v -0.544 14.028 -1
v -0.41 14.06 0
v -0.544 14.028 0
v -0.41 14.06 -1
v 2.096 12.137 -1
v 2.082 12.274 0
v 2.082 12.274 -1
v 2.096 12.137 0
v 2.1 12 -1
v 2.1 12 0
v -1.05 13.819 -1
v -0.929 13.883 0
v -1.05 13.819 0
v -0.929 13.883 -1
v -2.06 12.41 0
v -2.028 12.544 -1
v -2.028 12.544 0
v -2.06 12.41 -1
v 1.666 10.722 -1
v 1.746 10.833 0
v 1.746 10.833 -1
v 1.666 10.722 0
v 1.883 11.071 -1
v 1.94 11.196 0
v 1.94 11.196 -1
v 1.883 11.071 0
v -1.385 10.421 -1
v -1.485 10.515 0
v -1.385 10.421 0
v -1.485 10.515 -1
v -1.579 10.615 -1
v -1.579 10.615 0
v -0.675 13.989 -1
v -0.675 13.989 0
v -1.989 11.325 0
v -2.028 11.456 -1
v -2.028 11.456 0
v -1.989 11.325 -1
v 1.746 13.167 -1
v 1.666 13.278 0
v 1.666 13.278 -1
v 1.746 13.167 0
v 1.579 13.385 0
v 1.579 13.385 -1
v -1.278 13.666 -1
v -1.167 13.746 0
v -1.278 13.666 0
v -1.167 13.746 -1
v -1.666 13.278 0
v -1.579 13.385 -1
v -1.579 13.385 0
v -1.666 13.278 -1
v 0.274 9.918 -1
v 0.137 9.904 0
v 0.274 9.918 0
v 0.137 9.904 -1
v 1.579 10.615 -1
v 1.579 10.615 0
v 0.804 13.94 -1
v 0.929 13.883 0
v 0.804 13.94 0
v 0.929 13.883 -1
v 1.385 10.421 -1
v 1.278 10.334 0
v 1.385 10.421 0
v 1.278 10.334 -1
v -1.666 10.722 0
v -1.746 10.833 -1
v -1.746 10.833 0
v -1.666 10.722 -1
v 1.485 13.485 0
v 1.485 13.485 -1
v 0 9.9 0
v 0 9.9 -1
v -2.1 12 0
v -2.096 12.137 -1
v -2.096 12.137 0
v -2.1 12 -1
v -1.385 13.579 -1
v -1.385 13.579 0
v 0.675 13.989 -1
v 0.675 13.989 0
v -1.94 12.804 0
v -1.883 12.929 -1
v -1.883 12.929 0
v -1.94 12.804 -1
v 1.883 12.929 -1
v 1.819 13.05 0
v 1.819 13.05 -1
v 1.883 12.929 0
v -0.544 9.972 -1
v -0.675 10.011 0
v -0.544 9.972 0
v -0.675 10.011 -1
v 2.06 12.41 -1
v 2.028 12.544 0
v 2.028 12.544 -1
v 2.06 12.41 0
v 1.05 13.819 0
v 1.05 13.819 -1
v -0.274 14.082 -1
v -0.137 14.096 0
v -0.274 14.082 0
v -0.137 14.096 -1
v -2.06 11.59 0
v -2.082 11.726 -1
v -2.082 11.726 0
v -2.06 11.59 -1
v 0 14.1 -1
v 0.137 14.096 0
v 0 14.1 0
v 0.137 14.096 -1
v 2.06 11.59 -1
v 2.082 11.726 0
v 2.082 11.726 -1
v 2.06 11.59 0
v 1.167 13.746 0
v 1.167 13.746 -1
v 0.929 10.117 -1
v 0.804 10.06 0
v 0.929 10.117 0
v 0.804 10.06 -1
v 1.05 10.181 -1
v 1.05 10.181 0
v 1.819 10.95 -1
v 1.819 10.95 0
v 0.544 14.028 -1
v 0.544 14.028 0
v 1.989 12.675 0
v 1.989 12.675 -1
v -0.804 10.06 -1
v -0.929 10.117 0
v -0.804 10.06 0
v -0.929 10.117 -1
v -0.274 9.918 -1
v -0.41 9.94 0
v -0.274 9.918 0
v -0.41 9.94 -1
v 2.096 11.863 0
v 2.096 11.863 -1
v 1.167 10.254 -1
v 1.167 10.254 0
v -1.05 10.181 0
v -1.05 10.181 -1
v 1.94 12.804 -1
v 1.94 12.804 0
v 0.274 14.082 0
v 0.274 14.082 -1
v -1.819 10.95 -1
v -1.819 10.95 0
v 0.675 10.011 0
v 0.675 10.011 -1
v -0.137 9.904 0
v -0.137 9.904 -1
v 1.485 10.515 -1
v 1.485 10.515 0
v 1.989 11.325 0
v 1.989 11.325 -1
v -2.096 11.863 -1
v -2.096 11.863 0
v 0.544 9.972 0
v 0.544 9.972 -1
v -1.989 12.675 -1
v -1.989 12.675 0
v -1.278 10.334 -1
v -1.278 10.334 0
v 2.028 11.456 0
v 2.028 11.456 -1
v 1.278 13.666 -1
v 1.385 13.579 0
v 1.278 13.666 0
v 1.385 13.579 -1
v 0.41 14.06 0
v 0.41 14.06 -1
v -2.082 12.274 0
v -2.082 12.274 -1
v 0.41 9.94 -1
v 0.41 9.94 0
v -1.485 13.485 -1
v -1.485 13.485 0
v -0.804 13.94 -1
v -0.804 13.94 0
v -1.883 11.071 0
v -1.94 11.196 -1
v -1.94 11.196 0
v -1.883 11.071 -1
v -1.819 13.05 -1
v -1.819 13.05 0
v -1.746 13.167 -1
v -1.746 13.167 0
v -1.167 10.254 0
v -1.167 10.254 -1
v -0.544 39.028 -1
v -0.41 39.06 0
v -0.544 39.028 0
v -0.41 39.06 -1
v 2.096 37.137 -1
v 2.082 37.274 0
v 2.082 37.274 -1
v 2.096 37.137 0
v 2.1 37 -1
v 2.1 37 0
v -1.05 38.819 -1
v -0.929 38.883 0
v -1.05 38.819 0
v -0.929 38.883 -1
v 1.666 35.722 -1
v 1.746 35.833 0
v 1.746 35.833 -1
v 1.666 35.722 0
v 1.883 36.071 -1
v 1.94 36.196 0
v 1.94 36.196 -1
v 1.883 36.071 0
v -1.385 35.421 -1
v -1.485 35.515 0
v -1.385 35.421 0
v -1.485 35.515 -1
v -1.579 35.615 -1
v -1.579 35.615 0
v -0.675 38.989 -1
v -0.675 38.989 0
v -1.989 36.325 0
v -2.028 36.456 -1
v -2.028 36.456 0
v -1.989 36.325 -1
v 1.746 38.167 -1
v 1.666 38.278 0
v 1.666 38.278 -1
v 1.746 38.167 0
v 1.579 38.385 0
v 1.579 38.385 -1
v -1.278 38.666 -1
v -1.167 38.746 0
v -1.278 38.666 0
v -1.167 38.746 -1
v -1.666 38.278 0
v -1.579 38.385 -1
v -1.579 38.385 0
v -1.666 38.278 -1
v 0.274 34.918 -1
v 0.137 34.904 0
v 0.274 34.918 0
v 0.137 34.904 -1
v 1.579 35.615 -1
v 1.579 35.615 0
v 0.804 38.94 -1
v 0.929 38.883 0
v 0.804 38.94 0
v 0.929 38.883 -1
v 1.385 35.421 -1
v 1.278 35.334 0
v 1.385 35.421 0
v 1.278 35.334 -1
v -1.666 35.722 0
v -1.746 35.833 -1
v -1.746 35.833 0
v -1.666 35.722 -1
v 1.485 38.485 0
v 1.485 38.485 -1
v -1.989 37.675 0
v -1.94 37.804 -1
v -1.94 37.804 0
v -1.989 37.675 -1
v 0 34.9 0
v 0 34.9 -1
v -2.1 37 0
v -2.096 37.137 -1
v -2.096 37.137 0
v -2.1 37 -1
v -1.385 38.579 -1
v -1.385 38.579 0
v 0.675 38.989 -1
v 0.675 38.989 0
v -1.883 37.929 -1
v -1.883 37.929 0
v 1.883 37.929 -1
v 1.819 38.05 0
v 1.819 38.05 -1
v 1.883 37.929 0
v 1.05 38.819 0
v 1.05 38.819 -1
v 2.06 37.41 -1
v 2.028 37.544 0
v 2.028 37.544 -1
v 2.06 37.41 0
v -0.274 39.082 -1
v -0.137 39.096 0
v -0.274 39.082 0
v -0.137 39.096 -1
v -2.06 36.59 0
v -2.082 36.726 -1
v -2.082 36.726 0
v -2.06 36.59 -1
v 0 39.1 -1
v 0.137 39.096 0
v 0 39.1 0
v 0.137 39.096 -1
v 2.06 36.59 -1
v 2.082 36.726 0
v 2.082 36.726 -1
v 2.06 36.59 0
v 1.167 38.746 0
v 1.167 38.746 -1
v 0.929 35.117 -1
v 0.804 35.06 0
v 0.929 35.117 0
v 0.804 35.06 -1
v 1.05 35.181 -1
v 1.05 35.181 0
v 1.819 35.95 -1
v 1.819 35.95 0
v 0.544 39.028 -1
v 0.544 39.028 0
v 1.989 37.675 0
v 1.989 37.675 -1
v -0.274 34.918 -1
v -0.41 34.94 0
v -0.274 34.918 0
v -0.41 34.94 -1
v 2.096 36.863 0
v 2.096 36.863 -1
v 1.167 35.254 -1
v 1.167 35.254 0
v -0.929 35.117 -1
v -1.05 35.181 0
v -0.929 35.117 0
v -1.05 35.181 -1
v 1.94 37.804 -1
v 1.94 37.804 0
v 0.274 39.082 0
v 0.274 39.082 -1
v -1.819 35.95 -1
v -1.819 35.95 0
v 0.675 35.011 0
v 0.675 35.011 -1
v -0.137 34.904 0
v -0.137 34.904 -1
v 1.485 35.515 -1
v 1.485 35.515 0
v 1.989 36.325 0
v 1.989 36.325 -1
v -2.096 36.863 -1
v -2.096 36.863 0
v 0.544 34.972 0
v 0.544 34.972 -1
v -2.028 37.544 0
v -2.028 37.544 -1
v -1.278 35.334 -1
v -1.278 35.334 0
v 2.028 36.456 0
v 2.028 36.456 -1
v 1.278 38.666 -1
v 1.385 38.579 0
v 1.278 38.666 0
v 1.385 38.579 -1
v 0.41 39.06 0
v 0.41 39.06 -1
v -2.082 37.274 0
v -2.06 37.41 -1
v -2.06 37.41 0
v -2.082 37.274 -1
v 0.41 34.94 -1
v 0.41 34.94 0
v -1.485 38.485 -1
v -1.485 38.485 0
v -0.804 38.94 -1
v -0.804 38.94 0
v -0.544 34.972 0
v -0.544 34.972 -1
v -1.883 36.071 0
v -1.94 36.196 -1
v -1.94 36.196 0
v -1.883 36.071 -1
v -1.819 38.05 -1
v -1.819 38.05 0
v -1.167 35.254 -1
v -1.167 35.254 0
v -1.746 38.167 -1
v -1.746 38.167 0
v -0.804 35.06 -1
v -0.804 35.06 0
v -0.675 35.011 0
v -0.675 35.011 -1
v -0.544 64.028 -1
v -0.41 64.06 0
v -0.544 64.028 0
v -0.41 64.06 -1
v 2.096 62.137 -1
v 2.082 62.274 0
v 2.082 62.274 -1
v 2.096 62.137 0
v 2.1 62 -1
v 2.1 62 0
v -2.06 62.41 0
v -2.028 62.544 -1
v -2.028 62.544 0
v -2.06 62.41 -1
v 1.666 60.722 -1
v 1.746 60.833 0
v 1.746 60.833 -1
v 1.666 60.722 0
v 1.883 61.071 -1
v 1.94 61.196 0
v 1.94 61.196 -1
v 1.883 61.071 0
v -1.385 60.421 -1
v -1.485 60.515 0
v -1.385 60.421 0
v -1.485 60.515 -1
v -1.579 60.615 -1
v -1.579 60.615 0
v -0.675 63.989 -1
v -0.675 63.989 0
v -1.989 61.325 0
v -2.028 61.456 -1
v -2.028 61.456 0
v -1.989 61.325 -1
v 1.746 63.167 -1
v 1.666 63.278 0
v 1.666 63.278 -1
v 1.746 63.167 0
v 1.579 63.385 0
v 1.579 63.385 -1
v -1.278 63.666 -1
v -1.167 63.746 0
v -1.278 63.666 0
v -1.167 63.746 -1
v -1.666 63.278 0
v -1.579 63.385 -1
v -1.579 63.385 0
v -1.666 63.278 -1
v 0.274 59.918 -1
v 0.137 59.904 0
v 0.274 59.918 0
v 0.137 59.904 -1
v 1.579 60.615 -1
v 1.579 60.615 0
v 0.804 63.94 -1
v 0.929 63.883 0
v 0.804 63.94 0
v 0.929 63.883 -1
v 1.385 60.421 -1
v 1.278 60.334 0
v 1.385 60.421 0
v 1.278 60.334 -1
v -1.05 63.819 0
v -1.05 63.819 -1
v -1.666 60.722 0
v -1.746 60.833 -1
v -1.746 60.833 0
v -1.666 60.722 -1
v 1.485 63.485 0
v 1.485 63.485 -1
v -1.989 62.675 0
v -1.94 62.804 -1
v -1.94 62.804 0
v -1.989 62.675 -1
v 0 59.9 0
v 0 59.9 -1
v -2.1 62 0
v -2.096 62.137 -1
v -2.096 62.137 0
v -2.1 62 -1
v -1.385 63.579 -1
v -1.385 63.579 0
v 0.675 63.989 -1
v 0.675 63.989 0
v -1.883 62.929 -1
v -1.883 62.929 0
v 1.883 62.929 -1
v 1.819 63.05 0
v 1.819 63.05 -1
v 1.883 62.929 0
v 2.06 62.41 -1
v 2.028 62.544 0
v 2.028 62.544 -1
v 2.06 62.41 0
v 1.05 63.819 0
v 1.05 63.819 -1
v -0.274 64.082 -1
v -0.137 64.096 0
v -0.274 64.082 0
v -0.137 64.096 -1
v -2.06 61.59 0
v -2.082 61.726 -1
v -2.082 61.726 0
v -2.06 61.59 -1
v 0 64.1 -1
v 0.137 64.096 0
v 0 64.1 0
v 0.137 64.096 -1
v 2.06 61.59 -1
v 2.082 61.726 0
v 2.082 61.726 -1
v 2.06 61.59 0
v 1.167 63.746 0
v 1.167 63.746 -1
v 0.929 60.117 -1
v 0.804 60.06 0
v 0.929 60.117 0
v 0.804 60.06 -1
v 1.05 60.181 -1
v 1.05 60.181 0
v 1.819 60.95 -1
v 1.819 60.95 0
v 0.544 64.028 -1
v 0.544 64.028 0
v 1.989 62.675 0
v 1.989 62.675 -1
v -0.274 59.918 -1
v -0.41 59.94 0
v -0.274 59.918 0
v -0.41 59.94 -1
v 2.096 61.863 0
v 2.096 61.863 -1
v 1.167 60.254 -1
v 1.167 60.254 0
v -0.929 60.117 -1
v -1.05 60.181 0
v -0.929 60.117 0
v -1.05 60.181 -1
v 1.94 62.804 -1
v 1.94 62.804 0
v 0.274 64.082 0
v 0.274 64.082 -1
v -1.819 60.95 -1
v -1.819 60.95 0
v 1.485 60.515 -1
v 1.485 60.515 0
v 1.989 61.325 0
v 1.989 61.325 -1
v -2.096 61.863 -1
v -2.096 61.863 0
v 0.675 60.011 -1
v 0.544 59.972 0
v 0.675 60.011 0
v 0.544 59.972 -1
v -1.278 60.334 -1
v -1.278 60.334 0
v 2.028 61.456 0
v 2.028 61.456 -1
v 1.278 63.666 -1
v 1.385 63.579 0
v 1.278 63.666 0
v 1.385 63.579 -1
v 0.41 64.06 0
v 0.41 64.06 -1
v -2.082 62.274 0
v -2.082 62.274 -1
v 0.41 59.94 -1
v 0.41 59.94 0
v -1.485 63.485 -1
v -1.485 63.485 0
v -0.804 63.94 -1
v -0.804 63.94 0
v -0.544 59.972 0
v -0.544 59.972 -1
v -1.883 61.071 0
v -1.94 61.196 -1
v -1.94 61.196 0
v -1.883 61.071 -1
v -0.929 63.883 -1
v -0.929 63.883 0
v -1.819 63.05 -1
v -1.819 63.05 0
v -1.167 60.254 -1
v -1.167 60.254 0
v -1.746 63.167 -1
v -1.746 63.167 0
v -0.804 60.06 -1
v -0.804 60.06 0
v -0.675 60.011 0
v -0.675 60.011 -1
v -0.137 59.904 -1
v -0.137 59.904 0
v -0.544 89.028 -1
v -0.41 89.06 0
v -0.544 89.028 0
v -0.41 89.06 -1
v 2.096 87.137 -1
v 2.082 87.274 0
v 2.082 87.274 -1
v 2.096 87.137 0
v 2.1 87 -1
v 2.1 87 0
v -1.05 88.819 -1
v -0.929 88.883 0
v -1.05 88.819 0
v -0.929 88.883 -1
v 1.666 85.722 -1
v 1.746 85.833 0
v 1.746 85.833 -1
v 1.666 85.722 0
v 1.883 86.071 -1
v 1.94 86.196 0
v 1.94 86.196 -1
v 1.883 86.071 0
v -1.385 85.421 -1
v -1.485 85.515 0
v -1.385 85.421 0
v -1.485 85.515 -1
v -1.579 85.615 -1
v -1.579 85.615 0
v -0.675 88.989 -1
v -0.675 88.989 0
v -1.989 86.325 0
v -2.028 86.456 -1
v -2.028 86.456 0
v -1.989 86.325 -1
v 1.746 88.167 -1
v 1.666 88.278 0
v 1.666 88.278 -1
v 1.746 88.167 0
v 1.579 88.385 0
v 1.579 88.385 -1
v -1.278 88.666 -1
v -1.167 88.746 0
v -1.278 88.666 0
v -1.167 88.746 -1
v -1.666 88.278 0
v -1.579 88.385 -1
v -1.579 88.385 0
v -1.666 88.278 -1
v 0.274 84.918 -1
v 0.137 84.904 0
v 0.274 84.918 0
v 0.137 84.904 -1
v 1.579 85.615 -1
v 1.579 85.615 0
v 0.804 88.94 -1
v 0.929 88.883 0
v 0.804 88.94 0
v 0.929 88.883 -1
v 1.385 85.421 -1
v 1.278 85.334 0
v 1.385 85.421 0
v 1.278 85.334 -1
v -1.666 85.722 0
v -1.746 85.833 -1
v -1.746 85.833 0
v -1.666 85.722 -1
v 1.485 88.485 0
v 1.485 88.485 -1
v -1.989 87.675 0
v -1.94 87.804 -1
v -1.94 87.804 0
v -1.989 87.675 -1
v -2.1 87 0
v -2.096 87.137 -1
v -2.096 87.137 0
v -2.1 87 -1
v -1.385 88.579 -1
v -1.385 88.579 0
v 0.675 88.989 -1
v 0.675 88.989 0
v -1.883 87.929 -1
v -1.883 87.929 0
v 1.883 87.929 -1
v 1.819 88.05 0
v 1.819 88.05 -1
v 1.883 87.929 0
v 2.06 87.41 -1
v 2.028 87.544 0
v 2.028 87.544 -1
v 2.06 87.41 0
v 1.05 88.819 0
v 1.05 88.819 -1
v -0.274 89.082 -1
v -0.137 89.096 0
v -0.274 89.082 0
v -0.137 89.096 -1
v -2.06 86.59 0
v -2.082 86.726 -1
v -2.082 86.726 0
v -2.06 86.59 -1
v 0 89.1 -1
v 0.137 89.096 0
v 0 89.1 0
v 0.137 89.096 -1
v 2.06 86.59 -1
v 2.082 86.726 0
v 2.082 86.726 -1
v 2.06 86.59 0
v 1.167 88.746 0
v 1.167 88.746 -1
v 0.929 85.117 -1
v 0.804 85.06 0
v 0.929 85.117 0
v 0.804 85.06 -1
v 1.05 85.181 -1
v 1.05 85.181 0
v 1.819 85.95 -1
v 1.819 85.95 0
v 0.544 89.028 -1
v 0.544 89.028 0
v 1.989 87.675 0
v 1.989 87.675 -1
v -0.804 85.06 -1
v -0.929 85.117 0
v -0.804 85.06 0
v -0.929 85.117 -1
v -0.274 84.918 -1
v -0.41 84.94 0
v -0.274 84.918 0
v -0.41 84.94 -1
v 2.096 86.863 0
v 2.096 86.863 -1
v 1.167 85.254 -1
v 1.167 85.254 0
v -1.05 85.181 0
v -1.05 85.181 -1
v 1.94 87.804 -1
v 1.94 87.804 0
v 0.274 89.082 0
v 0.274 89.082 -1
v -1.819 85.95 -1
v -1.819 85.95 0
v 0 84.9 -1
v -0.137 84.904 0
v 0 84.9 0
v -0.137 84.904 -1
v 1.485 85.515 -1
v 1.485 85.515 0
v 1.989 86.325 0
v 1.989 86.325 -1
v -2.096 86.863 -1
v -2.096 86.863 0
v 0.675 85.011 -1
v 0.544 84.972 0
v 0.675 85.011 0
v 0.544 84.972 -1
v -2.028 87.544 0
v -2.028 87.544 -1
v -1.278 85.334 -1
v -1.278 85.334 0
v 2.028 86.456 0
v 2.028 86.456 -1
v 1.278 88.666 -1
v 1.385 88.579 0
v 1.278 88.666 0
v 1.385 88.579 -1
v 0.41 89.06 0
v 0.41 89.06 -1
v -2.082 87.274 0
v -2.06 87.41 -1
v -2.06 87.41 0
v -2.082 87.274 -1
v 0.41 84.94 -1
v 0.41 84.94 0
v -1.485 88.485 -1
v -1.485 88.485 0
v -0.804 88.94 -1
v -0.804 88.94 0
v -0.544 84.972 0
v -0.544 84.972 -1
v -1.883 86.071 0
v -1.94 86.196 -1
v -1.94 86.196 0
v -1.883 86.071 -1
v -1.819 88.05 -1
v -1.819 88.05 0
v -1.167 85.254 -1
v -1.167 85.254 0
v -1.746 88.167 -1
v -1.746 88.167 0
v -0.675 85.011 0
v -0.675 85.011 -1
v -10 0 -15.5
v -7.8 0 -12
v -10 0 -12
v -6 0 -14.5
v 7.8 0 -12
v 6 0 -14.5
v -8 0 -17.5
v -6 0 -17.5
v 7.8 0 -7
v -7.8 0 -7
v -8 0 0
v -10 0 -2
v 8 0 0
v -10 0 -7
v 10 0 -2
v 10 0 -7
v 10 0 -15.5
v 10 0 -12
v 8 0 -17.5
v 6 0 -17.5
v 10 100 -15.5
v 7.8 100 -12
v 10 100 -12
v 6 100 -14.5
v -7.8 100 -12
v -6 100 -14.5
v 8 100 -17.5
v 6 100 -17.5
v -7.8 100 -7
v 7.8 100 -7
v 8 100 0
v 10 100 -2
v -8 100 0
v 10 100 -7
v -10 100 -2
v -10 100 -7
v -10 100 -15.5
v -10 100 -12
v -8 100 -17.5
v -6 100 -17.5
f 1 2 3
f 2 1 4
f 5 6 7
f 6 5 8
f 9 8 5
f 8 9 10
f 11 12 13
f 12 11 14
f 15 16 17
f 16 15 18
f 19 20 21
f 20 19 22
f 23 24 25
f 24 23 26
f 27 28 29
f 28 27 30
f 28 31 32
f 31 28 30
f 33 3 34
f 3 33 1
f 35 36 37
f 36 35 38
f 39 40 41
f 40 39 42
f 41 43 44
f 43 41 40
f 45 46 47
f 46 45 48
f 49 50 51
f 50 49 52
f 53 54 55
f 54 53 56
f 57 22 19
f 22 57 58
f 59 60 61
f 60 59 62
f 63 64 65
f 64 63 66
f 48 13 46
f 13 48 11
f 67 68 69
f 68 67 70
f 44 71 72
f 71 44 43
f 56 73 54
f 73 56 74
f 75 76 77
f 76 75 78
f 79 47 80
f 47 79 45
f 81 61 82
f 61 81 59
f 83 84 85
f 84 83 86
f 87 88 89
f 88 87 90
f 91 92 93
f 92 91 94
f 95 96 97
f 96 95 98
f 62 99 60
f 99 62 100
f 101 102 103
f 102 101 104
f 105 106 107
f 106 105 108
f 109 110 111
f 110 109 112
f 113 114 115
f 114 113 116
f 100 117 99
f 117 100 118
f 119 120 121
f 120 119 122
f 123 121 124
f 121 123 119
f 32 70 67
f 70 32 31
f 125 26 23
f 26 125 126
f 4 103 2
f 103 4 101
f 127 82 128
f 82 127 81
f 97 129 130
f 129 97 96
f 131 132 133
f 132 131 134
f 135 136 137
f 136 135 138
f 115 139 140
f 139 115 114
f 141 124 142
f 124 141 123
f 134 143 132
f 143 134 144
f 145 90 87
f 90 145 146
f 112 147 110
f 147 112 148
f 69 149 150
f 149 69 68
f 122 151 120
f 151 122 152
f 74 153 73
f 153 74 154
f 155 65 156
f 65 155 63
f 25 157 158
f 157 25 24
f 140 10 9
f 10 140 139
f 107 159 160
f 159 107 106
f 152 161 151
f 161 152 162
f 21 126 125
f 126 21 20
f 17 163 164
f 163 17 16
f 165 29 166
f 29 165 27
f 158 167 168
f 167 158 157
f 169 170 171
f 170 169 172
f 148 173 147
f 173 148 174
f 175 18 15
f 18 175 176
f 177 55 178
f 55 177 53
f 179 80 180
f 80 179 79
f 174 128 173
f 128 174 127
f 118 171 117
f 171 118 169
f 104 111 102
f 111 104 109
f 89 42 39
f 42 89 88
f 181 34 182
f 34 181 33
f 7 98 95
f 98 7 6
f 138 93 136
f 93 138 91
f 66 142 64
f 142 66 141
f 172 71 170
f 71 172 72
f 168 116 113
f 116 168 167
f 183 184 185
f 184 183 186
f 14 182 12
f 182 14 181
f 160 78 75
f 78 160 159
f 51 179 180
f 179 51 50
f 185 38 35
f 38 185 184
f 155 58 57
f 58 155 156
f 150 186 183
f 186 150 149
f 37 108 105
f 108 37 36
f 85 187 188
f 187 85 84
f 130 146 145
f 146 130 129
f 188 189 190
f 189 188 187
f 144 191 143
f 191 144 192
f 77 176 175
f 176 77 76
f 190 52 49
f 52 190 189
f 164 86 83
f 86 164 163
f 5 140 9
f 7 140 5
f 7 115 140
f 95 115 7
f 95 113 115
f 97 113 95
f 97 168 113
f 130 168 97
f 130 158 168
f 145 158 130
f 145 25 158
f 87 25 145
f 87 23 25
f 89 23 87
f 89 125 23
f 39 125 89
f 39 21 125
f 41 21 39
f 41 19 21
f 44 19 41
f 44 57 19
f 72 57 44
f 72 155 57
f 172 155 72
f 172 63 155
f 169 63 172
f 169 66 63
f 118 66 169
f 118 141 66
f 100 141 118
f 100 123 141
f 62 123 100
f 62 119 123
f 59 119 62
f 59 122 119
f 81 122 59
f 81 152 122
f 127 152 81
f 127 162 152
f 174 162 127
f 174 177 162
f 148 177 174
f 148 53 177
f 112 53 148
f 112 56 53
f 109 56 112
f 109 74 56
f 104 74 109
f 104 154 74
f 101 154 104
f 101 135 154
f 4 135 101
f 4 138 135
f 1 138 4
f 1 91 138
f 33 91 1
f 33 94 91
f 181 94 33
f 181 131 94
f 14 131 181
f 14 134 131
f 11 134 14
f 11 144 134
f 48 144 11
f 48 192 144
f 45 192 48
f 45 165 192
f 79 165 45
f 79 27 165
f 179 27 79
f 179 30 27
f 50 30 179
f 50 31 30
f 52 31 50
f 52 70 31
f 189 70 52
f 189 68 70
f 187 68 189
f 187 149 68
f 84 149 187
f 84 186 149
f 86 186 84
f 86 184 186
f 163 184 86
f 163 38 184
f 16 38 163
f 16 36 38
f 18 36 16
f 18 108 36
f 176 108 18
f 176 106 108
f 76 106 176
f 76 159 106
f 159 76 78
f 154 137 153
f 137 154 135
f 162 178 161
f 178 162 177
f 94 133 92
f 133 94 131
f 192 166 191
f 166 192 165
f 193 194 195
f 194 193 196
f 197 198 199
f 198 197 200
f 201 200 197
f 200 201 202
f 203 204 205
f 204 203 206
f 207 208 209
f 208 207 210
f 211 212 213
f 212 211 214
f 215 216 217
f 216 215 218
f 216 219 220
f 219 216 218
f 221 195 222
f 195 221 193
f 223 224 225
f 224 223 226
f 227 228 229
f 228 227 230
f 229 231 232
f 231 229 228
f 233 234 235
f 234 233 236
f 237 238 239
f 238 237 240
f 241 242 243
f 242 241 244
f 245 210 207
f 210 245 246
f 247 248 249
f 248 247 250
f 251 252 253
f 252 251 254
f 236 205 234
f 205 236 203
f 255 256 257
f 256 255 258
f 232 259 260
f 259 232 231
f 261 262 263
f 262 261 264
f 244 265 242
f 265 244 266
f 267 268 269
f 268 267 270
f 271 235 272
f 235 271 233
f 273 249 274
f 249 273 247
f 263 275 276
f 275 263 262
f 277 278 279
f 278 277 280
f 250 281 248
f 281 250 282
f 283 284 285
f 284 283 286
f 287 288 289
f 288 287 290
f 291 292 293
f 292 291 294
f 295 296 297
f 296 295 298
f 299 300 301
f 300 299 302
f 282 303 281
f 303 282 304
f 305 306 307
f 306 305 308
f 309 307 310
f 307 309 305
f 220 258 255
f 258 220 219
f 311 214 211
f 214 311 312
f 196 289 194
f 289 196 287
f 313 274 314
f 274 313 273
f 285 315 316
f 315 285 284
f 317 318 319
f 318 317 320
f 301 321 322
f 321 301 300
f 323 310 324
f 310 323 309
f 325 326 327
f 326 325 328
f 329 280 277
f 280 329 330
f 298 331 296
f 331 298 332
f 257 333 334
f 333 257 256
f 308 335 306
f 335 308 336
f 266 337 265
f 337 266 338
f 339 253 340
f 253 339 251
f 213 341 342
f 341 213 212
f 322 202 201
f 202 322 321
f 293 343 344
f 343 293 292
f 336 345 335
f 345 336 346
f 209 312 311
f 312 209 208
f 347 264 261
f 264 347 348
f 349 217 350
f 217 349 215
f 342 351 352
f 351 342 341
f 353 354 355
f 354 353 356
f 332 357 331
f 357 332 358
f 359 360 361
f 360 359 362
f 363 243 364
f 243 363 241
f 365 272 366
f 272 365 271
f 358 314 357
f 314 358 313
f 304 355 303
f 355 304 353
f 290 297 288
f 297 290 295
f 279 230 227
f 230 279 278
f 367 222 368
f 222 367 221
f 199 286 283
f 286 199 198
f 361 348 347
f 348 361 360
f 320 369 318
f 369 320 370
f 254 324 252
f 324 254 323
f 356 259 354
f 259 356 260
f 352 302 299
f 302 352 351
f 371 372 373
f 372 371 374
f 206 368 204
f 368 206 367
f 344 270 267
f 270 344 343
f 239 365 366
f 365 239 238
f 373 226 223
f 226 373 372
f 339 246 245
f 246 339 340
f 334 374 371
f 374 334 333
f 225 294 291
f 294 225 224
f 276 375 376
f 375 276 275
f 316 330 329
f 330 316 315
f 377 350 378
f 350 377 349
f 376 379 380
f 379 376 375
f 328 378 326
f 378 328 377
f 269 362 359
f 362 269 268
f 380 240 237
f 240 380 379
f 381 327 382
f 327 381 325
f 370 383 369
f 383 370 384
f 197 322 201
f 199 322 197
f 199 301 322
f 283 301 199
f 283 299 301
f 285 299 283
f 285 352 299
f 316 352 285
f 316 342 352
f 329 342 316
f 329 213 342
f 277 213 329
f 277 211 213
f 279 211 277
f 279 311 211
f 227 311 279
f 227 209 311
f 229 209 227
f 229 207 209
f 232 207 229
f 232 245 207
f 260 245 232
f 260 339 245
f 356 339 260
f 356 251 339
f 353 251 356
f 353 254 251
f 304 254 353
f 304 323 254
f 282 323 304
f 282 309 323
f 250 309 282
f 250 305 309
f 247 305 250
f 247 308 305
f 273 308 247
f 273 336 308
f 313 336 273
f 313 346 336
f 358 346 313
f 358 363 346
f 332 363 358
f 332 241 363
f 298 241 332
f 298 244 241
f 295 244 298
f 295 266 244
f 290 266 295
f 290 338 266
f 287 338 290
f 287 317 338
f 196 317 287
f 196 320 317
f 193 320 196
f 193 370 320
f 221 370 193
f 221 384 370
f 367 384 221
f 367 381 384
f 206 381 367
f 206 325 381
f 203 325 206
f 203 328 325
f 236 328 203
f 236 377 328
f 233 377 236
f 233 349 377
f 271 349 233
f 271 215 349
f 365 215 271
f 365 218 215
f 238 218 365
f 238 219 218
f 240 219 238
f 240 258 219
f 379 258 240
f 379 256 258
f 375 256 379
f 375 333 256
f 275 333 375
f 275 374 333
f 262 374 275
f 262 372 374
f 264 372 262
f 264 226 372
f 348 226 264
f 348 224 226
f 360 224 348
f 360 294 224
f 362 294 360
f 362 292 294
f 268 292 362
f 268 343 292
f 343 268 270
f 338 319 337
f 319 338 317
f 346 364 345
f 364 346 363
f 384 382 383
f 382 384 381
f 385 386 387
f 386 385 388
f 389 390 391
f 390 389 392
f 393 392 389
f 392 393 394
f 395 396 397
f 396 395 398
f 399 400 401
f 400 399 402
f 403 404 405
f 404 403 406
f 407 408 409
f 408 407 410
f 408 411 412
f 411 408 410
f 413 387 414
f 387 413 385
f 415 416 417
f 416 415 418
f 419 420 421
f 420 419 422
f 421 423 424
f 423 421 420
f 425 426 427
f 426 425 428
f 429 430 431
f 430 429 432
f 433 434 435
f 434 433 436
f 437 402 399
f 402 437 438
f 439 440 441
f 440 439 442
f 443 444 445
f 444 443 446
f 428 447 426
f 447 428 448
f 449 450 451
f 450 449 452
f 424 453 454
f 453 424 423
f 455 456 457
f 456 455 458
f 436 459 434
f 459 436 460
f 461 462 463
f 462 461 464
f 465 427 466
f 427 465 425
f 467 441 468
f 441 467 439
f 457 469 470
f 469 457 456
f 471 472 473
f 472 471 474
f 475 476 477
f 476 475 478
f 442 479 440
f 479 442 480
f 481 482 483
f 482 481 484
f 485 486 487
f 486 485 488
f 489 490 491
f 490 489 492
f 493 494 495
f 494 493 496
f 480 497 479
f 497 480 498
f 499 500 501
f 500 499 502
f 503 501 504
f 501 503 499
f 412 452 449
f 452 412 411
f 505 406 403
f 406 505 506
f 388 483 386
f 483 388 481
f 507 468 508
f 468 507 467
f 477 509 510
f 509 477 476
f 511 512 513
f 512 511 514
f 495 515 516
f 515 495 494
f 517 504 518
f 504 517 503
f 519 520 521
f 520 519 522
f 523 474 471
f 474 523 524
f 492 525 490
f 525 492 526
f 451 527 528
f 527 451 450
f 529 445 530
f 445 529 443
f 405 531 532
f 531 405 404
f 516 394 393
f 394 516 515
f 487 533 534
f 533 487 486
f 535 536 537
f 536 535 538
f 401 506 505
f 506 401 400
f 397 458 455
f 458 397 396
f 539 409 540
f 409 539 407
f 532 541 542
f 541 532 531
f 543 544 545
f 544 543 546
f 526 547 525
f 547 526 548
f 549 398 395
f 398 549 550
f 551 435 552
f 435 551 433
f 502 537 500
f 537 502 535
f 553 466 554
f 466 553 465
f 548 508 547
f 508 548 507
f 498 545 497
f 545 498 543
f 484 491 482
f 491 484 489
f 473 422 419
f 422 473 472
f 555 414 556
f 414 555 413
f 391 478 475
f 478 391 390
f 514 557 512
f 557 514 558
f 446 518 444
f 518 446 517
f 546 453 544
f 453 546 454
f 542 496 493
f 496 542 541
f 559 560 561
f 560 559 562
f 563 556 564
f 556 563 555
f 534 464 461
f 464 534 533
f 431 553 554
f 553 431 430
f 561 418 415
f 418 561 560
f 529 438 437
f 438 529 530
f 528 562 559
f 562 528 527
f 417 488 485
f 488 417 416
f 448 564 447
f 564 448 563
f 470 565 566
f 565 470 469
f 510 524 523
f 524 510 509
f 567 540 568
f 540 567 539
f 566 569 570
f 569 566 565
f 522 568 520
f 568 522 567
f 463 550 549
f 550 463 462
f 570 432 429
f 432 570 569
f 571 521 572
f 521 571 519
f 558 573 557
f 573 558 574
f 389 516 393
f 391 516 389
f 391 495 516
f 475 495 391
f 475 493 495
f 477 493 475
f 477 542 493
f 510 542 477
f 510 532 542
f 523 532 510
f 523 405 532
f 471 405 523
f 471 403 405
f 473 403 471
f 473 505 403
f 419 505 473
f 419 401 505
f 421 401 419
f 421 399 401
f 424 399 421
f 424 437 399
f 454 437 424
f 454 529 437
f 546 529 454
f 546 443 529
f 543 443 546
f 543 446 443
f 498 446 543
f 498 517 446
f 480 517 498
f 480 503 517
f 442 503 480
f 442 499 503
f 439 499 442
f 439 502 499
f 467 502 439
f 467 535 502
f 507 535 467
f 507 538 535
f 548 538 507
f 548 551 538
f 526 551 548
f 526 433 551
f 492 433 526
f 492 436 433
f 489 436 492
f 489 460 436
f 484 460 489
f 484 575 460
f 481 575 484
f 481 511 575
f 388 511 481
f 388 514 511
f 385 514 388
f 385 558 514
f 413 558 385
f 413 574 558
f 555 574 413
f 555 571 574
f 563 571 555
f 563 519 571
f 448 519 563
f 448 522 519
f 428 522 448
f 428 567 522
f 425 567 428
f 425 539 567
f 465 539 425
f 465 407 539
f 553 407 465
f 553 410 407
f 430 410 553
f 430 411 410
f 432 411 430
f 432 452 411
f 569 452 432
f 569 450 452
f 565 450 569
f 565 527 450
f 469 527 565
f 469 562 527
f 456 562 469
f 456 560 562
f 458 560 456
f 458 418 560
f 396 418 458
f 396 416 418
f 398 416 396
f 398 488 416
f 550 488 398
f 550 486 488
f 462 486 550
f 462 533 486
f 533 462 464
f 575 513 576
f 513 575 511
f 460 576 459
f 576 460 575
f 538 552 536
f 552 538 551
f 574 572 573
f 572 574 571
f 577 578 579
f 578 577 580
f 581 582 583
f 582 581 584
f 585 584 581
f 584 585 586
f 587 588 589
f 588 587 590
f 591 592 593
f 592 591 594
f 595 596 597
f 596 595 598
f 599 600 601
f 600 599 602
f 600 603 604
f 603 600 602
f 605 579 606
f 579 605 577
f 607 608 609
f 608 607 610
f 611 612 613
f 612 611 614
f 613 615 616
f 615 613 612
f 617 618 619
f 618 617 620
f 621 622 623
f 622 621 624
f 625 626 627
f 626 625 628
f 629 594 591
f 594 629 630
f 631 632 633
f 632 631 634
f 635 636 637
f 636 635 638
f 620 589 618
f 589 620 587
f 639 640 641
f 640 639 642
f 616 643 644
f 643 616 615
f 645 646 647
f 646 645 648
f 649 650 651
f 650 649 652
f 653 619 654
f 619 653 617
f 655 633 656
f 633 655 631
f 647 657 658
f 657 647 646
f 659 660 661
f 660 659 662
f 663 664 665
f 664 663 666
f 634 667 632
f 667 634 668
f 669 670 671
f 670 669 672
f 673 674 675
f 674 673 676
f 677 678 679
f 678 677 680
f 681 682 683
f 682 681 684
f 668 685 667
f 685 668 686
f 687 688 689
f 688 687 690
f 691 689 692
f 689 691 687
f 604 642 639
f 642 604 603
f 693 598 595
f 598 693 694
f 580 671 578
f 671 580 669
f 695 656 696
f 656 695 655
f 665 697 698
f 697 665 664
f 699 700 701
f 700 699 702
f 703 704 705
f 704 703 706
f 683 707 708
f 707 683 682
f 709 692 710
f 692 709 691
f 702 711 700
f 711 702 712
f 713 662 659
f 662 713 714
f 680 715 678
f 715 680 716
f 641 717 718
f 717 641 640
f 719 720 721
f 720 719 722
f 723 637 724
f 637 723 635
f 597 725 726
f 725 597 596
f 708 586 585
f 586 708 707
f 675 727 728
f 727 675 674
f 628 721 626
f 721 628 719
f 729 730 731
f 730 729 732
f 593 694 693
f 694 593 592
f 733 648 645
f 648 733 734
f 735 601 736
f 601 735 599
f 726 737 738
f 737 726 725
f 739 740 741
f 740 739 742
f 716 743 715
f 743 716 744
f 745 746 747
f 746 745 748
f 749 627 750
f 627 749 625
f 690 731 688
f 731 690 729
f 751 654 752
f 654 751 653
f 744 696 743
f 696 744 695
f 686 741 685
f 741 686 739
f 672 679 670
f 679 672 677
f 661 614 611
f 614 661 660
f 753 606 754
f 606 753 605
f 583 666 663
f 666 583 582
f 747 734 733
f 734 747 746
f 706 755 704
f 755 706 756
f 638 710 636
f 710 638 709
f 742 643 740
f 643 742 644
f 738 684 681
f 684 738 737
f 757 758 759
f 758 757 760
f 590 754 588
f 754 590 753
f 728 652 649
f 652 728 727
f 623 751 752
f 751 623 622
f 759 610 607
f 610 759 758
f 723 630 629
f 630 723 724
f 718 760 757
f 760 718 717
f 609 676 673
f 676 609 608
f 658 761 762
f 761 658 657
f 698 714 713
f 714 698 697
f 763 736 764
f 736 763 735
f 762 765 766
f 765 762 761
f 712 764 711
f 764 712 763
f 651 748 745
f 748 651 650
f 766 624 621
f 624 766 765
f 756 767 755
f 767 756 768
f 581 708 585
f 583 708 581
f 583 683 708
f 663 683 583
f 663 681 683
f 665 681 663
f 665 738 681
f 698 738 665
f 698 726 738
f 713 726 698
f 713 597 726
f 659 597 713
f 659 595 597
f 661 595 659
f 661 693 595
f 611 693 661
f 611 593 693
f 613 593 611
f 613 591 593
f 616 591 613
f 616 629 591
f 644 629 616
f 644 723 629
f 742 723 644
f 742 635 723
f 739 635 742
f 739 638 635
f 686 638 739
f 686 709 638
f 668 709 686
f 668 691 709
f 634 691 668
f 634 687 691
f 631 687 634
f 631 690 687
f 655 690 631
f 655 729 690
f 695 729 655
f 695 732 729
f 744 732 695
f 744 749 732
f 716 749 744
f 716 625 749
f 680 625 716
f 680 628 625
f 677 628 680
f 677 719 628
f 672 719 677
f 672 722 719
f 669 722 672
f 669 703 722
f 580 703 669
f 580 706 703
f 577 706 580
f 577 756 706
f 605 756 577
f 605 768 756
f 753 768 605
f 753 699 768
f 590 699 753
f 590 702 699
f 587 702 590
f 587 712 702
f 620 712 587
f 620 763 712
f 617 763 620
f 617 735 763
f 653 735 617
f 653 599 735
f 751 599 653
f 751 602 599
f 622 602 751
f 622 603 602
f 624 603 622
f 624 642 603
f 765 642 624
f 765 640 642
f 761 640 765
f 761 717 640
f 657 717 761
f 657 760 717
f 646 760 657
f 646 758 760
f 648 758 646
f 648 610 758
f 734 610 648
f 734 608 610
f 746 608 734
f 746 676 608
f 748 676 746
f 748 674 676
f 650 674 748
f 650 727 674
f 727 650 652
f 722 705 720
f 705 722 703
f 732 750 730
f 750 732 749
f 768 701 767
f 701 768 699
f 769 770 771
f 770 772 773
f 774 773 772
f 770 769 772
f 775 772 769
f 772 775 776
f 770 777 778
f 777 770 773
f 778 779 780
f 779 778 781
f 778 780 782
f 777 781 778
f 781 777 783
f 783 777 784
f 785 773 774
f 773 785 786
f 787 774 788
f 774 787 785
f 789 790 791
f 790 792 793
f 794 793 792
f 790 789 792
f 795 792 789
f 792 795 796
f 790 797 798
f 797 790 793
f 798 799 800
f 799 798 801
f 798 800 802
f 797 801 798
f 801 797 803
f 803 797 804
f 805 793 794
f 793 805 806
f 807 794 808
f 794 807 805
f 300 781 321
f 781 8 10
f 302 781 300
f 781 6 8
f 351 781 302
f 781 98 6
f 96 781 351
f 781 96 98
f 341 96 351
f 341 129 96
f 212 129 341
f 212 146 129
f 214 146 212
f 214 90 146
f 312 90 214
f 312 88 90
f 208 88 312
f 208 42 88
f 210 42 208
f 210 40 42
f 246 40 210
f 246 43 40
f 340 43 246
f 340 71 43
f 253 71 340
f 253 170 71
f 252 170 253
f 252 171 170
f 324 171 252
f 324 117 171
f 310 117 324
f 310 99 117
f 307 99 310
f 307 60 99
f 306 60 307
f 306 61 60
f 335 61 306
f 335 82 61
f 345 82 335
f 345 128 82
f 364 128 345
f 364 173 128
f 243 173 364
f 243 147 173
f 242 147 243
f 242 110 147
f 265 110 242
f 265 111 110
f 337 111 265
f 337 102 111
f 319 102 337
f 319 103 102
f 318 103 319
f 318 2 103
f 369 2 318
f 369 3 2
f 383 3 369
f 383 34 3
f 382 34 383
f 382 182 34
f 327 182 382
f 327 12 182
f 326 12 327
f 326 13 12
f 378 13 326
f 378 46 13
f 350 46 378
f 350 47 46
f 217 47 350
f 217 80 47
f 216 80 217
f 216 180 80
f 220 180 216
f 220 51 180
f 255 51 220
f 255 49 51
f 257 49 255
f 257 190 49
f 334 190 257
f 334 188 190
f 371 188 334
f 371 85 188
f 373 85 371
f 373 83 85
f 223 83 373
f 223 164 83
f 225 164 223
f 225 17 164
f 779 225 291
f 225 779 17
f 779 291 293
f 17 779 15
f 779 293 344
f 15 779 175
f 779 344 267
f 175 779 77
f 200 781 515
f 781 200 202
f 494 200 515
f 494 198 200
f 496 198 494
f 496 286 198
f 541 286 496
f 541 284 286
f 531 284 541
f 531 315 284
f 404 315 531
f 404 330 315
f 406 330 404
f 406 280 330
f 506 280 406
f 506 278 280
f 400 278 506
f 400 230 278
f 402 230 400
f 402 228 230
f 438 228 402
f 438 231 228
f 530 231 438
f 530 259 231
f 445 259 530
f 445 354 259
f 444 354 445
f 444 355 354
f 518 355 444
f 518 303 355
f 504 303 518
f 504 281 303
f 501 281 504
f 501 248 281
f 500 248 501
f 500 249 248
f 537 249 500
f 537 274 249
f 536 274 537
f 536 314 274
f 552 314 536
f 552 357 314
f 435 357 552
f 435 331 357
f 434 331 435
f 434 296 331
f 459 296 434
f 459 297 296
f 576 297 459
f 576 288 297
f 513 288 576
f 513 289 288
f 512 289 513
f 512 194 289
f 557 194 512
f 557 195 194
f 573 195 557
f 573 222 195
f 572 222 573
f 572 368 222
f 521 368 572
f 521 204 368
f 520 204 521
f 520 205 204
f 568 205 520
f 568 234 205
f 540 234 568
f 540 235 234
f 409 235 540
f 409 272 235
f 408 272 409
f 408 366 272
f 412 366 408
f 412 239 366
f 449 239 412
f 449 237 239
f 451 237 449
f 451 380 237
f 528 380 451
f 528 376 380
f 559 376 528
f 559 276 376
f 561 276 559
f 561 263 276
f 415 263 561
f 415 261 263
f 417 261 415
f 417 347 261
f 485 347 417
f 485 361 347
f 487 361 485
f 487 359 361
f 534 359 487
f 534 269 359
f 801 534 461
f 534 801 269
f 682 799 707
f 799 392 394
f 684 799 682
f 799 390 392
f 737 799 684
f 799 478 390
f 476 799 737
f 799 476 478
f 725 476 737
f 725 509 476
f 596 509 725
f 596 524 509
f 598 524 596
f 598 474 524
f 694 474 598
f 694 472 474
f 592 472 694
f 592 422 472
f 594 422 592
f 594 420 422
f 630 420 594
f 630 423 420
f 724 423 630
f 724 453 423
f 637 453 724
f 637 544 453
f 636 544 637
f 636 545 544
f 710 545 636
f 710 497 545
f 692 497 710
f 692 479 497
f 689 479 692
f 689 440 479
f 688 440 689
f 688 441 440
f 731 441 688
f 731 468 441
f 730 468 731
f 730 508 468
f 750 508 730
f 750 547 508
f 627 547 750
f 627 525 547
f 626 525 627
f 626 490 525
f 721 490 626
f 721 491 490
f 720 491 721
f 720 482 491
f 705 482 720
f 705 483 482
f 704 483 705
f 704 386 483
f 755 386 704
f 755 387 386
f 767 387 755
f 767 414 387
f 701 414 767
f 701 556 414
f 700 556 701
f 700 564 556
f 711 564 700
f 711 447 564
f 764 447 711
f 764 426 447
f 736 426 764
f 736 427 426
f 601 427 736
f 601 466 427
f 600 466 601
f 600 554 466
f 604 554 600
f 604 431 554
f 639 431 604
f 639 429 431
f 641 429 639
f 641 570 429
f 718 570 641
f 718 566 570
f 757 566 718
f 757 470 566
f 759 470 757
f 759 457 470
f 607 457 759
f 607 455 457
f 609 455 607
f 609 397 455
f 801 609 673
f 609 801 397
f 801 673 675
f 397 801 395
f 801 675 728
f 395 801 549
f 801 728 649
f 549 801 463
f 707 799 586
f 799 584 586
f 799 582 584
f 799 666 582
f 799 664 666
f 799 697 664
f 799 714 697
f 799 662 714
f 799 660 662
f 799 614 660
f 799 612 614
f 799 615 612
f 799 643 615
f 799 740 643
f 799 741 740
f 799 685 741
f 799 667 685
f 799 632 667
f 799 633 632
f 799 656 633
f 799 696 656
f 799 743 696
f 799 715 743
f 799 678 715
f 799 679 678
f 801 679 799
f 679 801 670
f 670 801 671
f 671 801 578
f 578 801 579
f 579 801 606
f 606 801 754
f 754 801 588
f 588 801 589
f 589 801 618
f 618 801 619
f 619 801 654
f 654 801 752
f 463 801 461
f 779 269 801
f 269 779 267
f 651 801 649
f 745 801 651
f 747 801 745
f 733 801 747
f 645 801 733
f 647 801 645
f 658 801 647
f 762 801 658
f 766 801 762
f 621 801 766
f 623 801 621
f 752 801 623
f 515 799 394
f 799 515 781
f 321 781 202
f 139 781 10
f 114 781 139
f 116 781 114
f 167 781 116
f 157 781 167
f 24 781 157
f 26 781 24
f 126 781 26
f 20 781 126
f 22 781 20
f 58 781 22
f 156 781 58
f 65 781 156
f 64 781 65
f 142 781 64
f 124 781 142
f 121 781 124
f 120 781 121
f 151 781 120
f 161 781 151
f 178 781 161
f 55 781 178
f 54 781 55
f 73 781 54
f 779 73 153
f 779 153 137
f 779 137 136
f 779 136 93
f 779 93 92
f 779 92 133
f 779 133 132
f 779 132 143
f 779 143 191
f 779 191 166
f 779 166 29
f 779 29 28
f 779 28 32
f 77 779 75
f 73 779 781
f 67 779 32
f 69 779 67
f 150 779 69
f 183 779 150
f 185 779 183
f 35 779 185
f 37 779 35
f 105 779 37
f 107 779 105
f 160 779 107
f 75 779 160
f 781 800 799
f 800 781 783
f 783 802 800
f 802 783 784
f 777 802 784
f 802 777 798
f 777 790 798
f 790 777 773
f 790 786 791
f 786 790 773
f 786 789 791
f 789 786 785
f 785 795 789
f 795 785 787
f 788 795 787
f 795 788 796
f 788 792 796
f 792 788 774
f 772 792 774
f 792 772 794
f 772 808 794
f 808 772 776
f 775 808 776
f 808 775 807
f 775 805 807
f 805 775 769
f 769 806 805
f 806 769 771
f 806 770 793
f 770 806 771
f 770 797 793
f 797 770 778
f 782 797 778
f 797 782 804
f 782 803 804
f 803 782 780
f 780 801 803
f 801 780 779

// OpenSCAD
$fn = 96;

// Miniature linear guide rail
// Overall: 20.0mm wide (X), 17.5mm tall (Z), 100mm long (Y)

rail_w = 20.0;
rail_h = 17.5;
rail_l = 100.0;

// Profile details (tunable)
top_w = 12.0;          // top plateau width
top_h = 3.0;           // top plateau height
side_chamfer = 2.0;    // chamfer size on outer edges
groove_depth = 2.2;    // side groove depth
groove_h = 5.0;        // side groove height
groove_z = 7.0;        // groove bottom Z from base

// Mounting holes (along Y, drilled in Z)
hole_d = 4.2;          // through hole diameter
csk_d = 7.8;           // counterbore diameter
csk_h = 2.2;           // counterbore depth
end_margin = 12.0;     // distance from ends to first/last hole
hole_pitch = 25.0;     // spacing along length

eps = 0.02;

module rail_profile_2d() {
    // Outer profile in X-Z plane (z from 0..rail_h)
    difference() {
        polygon(points=[
            [-rail_w/2 + side_chamfer, 0],
            [ rail_w/2 - side_chamfer, 0],
            [ rail_w/2, side_chamfer],
            [ rail_w/2, rail_h - side_chamfer],
            [ rail_w/2 - side_chamfer, rail_h],
            [ rail_w/2 - (rail_w - top_w)/2, rail_h],
            [ rail_w/2 - (rail_w - top_w)/2, rail_h - top_h],
            [-rail_w/2 + (rail_w - top_w)/2, rail_h - top_h],
            [-rail_w/2 + (rail_w - top_w)/2, rail_h],
            [-rail_w/2 + side_chamfer, rail_h],
            [-rail_w/2, rail_h - side_chamfer],
            [-rail_w/2, side_chamfer]
        ]);

        // Side grooves (both sides), rectangular cuts
        for (sx = [-1, 1]) {
            translate([sx*(rail_w/2 - groove_depth/2), groove_z + groove_h/2])
                square([groove_depth, groove_h], center=true);
        }
    }
}

module rail_body() {
    // Extrude along Y; keep rail spanning Y=[0..rail_l]
    rotate([-90, 0, 0])
        linear_extrude(height=rail_l, center=false, convexity=10)
            rail_profile_2d();
}

module mounting_holes() {
    // Through holes + counterbores from top, drilled along -Z
    for (y = [end_margin : hole_pitch : rail_l - end_margin + eps]) {
        // Through hole (Z axis)
        translate([0, y, -1])
            cylinder(d=hole_d, h=rail_h + 2, center=false);

        // Counterbore from top
        translate([0, y, rail_h - csk_h])
            cylinder(d=csk_d, h=csk_h + 1, center=false);
    }
}

difference() {
    rail_body();
    mounting_holes();
}
